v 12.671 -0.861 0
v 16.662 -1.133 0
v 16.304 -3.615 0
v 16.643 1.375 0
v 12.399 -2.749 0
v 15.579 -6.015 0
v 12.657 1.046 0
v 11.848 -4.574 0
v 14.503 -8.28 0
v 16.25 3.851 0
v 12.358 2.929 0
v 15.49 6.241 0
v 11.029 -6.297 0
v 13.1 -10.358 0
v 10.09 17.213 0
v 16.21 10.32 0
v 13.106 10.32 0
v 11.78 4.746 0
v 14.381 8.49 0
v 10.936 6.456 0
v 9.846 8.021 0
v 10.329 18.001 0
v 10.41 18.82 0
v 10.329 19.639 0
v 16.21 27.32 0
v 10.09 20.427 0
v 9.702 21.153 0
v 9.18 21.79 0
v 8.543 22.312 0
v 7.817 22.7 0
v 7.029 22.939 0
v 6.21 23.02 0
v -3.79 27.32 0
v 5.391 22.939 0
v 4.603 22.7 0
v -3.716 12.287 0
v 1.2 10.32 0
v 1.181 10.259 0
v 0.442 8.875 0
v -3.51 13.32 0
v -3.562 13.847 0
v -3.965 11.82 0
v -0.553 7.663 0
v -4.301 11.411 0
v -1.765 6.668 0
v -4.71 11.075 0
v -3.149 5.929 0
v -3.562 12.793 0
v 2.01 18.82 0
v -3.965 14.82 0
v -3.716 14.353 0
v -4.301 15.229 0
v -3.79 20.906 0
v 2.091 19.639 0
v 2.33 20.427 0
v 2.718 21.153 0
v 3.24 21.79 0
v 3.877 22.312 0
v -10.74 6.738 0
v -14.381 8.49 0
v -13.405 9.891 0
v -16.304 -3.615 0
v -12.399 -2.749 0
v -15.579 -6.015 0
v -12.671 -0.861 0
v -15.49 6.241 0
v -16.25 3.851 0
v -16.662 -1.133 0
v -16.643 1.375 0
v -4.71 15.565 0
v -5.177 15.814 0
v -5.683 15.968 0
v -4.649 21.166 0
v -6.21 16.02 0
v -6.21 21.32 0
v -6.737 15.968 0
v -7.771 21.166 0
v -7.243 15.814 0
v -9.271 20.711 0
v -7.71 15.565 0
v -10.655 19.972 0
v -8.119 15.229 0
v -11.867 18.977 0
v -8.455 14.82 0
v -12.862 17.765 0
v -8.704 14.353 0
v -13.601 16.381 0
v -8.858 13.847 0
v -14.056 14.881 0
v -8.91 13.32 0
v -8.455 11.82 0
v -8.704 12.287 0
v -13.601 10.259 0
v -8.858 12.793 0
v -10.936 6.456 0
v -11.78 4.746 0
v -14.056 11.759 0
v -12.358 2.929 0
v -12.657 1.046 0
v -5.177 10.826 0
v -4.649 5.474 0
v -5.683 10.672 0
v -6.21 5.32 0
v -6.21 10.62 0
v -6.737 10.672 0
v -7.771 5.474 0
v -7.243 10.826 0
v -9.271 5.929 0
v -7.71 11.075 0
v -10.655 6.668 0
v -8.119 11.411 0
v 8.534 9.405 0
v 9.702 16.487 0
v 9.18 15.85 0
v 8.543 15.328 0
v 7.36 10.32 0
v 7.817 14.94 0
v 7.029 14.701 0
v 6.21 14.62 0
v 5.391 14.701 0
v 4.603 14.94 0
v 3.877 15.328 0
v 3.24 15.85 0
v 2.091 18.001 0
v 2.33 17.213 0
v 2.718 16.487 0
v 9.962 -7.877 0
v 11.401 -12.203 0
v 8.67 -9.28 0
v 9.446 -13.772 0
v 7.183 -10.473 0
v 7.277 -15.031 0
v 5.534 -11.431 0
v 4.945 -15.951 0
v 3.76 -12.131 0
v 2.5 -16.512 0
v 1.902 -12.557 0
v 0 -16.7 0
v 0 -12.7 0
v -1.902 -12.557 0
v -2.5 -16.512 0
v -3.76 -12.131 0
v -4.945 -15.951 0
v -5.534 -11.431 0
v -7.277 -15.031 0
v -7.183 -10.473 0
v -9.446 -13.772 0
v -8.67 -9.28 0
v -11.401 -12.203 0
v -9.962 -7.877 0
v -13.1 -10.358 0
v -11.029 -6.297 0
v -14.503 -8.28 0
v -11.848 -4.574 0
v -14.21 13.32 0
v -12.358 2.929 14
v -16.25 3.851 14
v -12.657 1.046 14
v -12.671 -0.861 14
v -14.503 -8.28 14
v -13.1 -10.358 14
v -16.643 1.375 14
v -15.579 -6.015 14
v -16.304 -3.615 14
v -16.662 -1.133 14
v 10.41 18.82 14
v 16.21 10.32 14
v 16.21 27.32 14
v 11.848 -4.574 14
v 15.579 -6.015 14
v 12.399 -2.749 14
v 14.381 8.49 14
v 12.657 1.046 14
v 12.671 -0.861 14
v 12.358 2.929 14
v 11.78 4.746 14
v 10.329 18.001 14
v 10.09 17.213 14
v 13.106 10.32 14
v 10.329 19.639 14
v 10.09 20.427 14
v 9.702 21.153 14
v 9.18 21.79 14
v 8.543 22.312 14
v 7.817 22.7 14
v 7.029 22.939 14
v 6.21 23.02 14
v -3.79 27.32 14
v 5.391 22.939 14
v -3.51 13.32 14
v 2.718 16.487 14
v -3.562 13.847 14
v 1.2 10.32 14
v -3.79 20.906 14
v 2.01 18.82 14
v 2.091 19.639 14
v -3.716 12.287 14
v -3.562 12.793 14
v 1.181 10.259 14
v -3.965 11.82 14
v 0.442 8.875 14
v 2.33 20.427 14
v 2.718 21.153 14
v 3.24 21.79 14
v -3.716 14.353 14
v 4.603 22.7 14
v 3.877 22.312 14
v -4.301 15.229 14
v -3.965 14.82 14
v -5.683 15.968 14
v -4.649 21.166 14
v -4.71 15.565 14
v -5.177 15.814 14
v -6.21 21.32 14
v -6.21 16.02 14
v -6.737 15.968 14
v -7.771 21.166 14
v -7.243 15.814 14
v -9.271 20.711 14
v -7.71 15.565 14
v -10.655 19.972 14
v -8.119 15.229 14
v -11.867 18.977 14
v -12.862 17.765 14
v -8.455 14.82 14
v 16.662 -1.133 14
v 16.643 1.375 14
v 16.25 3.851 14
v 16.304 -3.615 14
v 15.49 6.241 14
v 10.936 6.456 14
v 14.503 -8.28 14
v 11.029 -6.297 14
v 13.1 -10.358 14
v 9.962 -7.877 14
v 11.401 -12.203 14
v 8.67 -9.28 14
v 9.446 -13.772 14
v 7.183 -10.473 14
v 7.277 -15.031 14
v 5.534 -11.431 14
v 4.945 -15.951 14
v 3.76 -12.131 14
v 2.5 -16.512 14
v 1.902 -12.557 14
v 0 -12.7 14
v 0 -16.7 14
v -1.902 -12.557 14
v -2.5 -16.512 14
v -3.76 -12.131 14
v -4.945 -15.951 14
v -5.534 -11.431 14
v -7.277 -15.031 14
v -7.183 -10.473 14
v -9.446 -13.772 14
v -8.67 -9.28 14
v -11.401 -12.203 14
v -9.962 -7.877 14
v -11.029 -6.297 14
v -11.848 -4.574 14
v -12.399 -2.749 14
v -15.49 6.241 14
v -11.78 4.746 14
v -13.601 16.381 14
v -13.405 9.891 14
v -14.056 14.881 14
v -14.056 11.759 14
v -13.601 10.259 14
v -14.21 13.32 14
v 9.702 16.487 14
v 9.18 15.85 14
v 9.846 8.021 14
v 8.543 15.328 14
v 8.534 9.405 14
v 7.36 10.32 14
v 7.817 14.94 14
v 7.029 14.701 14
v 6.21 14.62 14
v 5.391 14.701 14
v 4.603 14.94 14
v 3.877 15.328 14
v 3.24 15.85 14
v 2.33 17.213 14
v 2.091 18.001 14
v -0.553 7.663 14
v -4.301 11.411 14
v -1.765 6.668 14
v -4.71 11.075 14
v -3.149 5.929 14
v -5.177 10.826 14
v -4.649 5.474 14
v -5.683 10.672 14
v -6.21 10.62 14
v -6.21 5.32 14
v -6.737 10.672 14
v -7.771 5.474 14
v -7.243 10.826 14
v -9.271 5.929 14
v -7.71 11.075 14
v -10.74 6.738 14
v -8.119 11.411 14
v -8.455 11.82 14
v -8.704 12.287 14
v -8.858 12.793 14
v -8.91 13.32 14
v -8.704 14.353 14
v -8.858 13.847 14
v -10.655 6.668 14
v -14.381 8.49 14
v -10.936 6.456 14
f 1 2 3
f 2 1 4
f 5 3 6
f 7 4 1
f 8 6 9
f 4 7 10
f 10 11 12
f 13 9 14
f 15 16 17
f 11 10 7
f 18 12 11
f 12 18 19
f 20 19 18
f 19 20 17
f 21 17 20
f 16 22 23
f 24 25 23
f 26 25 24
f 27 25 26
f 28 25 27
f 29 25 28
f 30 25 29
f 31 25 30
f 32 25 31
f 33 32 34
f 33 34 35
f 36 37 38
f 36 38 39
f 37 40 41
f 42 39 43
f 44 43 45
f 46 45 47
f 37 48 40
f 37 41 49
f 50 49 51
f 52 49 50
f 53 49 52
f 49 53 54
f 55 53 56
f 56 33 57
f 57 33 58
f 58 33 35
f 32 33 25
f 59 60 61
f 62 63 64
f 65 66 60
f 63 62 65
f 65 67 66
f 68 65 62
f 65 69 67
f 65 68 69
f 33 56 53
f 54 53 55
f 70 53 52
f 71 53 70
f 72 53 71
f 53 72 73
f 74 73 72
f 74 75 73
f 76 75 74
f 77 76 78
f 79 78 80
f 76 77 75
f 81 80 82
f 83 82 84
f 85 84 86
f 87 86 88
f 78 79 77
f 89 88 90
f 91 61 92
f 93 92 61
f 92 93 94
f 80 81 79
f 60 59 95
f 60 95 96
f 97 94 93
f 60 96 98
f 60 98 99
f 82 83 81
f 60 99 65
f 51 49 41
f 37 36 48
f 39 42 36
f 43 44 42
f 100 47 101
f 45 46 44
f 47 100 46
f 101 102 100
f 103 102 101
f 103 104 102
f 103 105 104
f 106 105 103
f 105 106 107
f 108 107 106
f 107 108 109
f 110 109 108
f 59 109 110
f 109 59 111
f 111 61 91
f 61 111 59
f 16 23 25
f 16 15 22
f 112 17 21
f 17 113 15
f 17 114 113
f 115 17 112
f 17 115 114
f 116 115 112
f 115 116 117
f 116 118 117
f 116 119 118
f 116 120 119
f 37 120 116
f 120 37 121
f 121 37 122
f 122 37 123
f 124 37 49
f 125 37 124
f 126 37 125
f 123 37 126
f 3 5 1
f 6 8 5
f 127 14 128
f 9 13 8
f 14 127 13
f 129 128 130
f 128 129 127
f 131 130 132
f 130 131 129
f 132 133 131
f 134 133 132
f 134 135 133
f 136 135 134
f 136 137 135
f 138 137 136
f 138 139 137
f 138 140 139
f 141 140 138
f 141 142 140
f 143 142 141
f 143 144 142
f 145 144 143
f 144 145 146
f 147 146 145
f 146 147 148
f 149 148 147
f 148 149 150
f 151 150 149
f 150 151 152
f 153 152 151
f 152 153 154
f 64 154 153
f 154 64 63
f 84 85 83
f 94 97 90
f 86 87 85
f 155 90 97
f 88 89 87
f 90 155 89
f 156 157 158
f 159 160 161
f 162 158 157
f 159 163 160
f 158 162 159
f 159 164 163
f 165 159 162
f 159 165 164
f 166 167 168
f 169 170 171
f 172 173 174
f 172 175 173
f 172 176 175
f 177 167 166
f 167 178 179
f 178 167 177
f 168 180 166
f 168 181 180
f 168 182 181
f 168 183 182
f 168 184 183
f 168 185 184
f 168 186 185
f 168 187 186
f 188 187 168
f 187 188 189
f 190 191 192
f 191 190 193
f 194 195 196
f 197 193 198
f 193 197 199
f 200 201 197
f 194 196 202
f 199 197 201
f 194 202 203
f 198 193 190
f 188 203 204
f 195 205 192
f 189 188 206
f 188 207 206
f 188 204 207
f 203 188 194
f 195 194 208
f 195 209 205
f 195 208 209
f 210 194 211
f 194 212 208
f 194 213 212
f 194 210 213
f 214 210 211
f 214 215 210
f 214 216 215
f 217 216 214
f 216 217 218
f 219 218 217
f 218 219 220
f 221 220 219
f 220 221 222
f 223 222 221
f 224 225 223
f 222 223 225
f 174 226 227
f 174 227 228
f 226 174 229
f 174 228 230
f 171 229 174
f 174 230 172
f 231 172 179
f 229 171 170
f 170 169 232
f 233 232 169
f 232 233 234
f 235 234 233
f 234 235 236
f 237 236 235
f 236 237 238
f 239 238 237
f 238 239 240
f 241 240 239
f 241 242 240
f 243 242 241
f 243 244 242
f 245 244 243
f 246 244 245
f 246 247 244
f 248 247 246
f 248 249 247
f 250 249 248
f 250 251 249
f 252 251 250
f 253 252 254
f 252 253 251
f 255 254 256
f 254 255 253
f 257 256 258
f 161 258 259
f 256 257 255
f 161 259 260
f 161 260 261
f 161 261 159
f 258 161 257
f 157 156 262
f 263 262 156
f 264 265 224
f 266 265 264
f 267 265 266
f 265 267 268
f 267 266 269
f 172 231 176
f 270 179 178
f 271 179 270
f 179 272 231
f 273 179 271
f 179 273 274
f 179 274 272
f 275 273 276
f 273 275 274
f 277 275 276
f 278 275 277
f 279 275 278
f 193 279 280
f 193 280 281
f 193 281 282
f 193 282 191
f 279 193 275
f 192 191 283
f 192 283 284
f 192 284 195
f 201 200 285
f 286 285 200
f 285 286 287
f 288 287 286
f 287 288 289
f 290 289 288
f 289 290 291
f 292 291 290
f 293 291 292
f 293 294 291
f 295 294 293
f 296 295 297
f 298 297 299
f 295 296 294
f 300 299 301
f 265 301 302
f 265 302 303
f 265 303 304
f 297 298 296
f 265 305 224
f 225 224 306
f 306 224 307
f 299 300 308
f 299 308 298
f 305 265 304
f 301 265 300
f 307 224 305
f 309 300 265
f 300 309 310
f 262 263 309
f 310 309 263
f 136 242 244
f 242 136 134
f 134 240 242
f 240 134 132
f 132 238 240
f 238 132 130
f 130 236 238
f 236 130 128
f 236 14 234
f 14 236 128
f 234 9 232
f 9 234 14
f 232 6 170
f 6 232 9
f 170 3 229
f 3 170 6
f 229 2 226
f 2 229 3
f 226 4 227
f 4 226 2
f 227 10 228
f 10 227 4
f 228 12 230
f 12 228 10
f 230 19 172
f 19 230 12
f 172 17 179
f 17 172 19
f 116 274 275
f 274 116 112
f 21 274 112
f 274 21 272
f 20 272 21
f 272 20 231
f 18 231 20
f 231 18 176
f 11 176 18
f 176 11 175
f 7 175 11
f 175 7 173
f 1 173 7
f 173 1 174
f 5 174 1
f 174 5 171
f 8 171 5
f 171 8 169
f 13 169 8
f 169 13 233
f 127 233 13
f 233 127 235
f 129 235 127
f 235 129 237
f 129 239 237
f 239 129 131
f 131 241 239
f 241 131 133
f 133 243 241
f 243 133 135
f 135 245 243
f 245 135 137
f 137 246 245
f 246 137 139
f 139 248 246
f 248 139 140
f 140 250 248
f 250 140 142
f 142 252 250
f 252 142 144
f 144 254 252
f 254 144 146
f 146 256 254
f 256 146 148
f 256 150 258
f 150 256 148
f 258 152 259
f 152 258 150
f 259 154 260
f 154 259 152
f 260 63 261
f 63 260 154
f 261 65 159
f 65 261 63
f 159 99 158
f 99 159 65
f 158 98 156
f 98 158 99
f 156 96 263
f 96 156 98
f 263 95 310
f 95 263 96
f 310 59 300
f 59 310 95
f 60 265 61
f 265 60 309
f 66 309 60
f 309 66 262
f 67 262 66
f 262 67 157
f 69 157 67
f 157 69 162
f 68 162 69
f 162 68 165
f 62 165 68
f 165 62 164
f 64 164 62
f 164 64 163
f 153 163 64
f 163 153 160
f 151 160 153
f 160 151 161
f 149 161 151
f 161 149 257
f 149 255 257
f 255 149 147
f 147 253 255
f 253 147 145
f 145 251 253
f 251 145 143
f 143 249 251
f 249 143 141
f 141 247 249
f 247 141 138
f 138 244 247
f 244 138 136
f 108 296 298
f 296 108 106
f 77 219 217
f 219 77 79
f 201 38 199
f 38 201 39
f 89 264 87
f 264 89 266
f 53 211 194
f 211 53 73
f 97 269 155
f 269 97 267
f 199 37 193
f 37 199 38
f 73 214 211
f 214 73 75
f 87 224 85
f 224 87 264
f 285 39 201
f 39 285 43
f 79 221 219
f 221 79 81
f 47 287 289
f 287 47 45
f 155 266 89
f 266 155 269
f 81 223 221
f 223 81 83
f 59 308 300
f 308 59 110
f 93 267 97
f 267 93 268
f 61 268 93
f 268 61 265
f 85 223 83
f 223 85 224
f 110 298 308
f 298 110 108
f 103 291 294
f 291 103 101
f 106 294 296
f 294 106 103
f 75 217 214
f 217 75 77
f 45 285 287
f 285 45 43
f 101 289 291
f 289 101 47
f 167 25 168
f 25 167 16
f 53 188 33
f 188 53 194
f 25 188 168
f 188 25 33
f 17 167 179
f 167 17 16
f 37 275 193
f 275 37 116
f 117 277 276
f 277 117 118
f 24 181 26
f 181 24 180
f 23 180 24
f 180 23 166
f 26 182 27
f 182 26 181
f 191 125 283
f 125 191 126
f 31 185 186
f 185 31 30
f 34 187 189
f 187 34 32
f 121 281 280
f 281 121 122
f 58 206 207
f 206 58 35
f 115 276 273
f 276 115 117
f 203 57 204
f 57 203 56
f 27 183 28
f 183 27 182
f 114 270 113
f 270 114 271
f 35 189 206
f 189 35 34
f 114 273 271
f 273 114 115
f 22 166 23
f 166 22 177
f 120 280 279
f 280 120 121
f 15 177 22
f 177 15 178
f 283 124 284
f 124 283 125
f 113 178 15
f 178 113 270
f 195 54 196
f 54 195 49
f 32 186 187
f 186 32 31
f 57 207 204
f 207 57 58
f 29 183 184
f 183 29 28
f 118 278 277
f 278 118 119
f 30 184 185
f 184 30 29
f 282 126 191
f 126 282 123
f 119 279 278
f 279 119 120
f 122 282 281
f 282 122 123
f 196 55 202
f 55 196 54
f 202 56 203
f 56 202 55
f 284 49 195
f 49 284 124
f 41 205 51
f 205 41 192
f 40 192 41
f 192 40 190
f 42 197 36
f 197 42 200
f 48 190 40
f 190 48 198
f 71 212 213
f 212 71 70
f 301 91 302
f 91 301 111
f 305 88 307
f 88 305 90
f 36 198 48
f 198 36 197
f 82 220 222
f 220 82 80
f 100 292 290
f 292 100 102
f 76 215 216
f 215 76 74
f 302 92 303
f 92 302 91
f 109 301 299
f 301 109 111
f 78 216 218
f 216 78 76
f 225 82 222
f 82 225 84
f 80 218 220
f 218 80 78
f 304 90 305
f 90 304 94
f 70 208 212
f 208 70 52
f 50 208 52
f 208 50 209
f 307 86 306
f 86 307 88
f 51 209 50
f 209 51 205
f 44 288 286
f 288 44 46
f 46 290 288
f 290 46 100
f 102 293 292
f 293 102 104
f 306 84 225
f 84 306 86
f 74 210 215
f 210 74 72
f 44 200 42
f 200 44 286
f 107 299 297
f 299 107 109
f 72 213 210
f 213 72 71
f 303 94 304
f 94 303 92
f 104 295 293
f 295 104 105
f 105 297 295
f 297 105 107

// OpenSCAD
$fn = 32;

// ----------------------------------------------------------------------
// Pipe clamp: 33.4 mm ring, 4 mm wall, 14 mm wide
// ----------------------------------------------------------------------

// --- parameters (mm) ---
outer_r = 16.7;           // clamp outside radius
inner_r = 12.7;           // pipe bore radius
band = 4;                 // band thickness
clamp_w = 14;             // clamp width
opening = 50;             // opening angle between the ends
lug_w = 20;               // lug width
lug_len = 17;             // lug length
bolt_d = 8.4;             // bolt hole
knuckle_d = 16;           // hinge knuckle diameter
pin_d = 5.4;              // hinge pin hole

clamp_profile = [[-7.058, 15.135], [-9.244, 13.908], [-11.223, 12.367], [-12.948, 10.547], [-14.381, 8.49], [-15.49, 6.241], [-16.25, 3.851], [-16.643, 1.375], [-16.662, -1.133], [-16.304, -3.615], [-15.579, -6.015], [-14.503, -8.28], [-13.1, -10.358], [-11.401, -12.203], [-9.446, -13.772], [-7.277, -15.031], [-4.945, -15.951], [-2.5, -16.512], [0, -16.7], [2.5, -16.512], [4.945, -15.951], [7.277, -15.031], [9.446, -13.772], [11.401, -12.203], [13.1, -10.358], [14.503, -8.28], [15.579, -6.015], [16.304, -3.615], [16.662, -1.133], [16.643, 1.375], [16.25, 3.851], [15.49, 6.241], [14.381, 8.49], [12.948, 10.547], [11.223, 12.367], [9.244, 13.908], [7.058, 15.135], [5.367, 11.51], [7.03, 10.577], [8.534, 9.405], [9.846, 8.021], [10.936, 6.456], [11.78, 4.746], [12.358, 2.929], [12.657, 1.046], [12.671, -0.861], [12.399, -2.749], [11.848, -4.574], [11.029, -6.297], [9.962, -7.877], [8.67, -9.28], [7.183, -10.473], [5.534, -11.431], [3.76, -12.131], [1.902, -12.557], [0, -12.7], [-1.902, -12.557], [-3.76, -12.131], [-5.534, -11.431], [-7.183, -10.473], [-8.67, -9.28], [-9.962, -7.877], [-11.029, -6.297], [-11.848, -4.574], [-12.399, -2.749], [-12.671, -0.861], [-12.657, 1.046], [-12.358, 2.929], [-11.78, 4.746], [-10.936, 6.456], [-9.846, 8.021], [-8.534, 9.405], [-7.03, 10.577], [-5.367, 11.51]];

difference() {
  union() {
    linear_extrude(height = clamp_w) polygon(clamp_profile);
    /* hinge knuckle, sunk 2 mm into the band end */
    translate([-6.21, 13.32, 0]) cylinder(h = clamp_w, d = knuckle_d);
    /* bolt lug on the other end */
    translate([-3.79, 10.32, 0]) cube([lug_w, 17, clamp_w]);
  }
  translate([6.21, 18.82, -2.5]) cylinder(h = clamp_w + 5, d = bolt_d);
  translate([-6.21, 13.32, -2.5]) cylinder(h = clamp_w + 5, d = pin_d);
}
